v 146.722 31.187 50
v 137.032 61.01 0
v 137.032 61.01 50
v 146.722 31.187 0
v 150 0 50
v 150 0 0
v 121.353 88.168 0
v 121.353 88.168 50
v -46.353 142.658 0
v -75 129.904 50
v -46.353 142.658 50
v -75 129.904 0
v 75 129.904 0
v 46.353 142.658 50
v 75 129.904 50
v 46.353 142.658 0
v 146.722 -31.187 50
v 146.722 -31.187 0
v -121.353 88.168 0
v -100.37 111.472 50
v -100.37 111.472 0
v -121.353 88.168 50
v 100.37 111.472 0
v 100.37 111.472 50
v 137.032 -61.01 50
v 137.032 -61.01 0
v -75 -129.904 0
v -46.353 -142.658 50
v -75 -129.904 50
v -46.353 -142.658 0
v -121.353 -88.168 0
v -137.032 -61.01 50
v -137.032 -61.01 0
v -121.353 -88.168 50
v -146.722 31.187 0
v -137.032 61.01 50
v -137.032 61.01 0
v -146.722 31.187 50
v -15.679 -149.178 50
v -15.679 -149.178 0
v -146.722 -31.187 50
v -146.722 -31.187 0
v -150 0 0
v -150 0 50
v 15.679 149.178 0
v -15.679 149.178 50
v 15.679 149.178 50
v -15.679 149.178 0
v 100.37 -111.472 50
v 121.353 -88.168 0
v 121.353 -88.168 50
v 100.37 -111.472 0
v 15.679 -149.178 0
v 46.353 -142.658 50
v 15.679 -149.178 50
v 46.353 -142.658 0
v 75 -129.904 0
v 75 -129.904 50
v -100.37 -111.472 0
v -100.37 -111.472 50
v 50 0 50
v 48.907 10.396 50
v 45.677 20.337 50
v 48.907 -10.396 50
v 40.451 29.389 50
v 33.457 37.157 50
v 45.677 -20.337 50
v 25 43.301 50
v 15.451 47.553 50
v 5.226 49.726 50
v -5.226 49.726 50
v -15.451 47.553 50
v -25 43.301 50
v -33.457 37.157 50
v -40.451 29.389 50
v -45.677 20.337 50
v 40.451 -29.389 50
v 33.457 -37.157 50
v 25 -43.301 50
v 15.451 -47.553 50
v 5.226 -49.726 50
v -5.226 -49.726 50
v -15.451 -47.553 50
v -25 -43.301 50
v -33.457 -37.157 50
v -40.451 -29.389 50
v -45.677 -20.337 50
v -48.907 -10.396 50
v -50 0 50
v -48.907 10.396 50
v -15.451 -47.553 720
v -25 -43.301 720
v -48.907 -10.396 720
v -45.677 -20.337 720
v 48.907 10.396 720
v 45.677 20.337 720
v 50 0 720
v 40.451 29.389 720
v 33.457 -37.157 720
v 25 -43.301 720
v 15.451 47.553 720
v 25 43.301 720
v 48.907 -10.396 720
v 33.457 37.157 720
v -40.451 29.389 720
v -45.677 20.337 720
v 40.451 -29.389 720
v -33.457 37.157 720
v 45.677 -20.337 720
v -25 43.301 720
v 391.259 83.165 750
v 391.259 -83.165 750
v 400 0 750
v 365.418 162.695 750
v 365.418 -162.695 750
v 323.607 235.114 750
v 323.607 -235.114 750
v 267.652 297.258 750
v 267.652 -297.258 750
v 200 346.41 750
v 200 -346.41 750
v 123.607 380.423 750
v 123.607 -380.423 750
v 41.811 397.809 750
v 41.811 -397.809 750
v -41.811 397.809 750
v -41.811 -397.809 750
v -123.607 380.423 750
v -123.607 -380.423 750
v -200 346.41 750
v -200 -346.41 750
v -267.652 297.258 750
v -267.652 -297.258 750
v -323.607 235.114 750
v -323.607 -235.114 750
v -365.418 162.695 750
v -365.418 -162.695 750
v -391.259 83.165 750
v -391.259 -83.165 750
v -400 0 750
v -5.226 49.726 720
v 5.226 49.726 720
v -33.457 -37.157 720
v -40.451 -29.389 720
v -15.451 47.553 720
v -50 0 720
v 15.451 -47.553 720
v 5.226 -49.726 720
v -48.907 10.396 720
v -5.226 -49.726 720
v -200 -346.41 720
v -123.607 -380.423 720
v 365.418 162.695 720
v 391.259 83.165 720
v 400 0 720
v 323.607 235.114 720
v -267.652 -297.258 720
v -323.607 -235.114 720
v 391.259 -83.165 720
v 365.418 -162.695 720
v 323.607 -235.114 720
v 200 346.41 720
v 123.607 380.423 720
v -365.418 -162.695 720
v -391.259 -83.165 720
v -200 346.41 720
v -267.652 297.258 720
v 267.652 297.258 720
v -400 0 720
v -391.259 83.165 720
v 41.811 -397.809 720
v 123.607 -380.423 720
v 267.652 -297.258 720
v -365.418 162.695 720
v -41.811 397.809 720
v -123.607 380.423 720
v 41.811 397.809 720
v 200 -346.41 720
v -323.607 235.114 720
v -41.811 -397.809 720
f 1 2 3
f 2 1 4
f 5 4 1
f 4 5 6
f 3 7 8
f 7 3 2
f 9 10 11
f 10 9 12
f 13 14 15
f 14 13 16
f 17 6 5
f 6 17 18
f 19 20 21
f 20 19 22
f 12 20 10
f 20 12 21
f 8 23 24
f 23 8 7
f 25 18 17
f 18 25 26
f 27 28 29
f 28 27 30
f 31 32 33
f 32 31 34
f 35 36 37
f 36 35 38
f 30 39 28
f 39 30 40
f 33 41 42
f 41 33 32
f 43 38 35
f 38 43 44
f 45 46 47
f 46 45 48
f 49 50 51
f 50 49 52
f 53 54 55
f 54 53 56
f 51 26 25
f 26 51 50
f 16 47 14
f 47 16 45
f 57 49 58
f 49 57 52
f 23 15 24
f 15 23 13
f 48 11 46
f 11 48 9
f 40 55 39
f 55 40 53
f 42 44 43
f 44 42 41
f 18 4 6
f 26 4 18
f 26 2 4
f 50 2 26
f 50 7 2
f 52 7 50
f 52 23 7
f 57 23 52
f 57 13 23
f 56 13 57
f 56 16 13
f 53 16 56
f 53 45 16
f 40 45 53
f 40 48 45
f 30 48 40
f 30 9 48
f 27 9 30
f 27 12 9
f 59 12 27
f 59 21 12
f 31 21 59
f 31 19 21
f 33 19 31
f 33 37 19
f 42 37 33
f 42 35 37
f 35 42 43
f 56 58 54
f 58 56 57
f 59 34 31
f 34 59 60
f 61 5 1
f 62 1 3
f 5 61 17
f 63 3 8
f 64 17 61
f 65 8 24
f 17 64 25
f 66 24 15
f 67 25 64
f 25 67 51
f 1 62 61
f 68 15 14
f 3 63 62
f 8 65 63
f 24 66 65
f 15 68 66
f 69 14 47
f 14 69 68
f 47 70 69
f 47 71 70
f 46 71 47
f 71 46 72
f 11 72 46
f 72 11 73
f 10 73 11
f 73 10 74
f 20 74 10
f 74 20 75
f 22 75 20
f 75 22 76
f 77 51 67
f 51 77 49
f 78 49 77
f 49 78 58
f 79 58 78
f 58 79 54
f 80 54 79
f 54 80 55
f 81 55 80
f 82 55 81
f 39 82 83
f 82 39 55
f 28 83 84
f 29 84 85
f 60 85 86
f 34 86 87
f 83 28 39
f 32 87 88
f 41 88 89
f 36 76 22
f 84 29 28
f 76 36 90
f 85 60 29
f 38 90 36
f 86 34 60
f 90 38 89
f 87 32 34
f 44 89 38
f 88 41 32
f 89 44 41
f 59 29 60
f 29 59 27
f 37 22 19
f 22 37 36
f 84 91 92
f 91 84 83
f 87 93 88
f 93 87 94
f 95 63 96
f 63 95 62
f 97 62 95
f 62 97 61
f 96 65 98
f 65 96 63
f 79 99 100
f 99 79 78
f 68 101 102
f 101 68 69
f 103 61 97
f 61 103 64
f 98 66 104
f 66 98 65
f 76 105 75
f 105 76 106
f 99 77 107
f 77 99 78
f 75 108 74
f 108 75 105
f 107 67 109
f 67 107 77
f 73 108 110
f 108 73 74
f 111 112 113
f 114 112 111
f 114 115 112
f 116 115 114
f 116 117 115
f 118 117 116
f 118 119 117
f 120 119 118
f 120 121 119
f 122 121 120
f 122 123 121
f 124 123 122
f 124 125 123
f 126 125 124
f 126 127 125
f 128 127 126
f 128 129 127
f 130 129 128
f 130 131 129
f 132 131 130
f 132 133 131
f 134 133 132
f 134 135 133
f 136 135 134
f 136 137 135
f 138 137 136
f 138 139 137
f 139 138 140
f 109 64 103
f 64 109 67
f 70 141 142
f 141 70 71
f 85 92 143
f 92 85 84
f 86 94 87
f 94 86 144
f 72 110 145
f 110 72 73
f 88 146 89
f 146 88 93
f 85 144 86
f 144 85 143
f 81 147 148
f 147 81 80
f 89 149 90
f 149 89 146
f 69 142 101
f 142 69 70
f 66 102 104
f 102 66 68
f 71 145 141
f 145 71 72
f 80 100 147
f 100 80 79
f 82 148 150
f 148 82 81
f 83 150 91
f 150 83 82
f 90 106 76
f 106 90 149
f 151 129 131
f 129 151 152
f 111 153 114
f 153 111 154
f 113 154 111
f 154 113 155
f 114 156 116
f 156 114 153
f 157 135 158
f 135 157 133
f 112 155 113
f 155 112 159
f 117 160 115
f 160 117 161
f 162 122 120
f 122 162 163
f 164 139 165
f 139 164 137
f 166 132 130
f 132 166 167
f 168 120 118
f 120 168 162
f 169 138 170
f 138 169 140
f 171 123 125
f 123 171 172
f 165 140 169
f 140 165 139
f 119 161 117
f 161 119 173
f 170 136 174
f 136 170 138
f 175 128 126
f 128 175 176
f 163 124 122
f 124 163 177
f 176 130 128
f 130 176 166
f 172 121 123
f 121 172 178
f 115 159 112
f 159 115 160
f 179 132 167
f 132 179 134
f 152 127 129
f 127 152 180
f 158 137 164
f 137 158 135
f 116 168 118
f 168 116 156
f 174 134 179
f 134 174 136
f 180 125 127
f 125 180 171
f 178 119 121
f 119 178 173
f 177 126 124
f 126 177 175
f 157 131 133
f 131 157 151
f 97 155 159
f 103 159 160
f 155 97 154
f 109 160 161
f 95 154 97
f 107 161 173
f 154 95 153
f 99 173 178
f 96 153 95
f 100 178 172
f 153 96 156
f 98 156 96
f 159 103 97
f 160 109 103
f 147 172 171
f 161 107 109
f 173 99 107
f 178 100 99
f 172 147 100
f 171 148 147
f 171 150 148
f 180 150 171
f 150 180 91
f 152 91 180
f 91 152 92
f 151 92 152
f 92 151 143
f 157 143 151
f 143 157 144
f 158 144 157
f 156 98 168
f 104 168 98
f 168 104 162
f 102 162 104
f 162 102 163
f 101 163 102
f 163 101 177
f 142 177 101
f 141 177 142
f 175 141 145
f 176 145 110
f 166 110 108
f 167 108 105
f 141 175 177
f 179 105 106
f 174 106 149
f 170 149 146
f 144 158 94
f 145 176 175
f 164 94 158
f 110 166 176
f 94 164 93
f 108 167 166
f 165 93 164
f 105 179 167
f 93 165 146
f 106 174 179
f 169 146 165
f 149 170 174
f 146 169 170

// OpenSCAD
// Author: Mihai Oltean, www.tcreate.org, mihai.oltean@gmail.com
// More details: jenny5.org
// Source: github.com/jenny5-robot
// MIT License
//--------------------------------------------------------------

module rounded_table(height, radius)
{
    sheet_thickness = 30;
// base
	cylinder (h = 50, r = 150);
	// leg
	cylinder (h = height, r = 50);
	// top sheet
	translate ([0, 0, height - sheet_thickness]) cylinder (h = sheet_thickness, r = radius);
}

rounded_table(750, 400);
